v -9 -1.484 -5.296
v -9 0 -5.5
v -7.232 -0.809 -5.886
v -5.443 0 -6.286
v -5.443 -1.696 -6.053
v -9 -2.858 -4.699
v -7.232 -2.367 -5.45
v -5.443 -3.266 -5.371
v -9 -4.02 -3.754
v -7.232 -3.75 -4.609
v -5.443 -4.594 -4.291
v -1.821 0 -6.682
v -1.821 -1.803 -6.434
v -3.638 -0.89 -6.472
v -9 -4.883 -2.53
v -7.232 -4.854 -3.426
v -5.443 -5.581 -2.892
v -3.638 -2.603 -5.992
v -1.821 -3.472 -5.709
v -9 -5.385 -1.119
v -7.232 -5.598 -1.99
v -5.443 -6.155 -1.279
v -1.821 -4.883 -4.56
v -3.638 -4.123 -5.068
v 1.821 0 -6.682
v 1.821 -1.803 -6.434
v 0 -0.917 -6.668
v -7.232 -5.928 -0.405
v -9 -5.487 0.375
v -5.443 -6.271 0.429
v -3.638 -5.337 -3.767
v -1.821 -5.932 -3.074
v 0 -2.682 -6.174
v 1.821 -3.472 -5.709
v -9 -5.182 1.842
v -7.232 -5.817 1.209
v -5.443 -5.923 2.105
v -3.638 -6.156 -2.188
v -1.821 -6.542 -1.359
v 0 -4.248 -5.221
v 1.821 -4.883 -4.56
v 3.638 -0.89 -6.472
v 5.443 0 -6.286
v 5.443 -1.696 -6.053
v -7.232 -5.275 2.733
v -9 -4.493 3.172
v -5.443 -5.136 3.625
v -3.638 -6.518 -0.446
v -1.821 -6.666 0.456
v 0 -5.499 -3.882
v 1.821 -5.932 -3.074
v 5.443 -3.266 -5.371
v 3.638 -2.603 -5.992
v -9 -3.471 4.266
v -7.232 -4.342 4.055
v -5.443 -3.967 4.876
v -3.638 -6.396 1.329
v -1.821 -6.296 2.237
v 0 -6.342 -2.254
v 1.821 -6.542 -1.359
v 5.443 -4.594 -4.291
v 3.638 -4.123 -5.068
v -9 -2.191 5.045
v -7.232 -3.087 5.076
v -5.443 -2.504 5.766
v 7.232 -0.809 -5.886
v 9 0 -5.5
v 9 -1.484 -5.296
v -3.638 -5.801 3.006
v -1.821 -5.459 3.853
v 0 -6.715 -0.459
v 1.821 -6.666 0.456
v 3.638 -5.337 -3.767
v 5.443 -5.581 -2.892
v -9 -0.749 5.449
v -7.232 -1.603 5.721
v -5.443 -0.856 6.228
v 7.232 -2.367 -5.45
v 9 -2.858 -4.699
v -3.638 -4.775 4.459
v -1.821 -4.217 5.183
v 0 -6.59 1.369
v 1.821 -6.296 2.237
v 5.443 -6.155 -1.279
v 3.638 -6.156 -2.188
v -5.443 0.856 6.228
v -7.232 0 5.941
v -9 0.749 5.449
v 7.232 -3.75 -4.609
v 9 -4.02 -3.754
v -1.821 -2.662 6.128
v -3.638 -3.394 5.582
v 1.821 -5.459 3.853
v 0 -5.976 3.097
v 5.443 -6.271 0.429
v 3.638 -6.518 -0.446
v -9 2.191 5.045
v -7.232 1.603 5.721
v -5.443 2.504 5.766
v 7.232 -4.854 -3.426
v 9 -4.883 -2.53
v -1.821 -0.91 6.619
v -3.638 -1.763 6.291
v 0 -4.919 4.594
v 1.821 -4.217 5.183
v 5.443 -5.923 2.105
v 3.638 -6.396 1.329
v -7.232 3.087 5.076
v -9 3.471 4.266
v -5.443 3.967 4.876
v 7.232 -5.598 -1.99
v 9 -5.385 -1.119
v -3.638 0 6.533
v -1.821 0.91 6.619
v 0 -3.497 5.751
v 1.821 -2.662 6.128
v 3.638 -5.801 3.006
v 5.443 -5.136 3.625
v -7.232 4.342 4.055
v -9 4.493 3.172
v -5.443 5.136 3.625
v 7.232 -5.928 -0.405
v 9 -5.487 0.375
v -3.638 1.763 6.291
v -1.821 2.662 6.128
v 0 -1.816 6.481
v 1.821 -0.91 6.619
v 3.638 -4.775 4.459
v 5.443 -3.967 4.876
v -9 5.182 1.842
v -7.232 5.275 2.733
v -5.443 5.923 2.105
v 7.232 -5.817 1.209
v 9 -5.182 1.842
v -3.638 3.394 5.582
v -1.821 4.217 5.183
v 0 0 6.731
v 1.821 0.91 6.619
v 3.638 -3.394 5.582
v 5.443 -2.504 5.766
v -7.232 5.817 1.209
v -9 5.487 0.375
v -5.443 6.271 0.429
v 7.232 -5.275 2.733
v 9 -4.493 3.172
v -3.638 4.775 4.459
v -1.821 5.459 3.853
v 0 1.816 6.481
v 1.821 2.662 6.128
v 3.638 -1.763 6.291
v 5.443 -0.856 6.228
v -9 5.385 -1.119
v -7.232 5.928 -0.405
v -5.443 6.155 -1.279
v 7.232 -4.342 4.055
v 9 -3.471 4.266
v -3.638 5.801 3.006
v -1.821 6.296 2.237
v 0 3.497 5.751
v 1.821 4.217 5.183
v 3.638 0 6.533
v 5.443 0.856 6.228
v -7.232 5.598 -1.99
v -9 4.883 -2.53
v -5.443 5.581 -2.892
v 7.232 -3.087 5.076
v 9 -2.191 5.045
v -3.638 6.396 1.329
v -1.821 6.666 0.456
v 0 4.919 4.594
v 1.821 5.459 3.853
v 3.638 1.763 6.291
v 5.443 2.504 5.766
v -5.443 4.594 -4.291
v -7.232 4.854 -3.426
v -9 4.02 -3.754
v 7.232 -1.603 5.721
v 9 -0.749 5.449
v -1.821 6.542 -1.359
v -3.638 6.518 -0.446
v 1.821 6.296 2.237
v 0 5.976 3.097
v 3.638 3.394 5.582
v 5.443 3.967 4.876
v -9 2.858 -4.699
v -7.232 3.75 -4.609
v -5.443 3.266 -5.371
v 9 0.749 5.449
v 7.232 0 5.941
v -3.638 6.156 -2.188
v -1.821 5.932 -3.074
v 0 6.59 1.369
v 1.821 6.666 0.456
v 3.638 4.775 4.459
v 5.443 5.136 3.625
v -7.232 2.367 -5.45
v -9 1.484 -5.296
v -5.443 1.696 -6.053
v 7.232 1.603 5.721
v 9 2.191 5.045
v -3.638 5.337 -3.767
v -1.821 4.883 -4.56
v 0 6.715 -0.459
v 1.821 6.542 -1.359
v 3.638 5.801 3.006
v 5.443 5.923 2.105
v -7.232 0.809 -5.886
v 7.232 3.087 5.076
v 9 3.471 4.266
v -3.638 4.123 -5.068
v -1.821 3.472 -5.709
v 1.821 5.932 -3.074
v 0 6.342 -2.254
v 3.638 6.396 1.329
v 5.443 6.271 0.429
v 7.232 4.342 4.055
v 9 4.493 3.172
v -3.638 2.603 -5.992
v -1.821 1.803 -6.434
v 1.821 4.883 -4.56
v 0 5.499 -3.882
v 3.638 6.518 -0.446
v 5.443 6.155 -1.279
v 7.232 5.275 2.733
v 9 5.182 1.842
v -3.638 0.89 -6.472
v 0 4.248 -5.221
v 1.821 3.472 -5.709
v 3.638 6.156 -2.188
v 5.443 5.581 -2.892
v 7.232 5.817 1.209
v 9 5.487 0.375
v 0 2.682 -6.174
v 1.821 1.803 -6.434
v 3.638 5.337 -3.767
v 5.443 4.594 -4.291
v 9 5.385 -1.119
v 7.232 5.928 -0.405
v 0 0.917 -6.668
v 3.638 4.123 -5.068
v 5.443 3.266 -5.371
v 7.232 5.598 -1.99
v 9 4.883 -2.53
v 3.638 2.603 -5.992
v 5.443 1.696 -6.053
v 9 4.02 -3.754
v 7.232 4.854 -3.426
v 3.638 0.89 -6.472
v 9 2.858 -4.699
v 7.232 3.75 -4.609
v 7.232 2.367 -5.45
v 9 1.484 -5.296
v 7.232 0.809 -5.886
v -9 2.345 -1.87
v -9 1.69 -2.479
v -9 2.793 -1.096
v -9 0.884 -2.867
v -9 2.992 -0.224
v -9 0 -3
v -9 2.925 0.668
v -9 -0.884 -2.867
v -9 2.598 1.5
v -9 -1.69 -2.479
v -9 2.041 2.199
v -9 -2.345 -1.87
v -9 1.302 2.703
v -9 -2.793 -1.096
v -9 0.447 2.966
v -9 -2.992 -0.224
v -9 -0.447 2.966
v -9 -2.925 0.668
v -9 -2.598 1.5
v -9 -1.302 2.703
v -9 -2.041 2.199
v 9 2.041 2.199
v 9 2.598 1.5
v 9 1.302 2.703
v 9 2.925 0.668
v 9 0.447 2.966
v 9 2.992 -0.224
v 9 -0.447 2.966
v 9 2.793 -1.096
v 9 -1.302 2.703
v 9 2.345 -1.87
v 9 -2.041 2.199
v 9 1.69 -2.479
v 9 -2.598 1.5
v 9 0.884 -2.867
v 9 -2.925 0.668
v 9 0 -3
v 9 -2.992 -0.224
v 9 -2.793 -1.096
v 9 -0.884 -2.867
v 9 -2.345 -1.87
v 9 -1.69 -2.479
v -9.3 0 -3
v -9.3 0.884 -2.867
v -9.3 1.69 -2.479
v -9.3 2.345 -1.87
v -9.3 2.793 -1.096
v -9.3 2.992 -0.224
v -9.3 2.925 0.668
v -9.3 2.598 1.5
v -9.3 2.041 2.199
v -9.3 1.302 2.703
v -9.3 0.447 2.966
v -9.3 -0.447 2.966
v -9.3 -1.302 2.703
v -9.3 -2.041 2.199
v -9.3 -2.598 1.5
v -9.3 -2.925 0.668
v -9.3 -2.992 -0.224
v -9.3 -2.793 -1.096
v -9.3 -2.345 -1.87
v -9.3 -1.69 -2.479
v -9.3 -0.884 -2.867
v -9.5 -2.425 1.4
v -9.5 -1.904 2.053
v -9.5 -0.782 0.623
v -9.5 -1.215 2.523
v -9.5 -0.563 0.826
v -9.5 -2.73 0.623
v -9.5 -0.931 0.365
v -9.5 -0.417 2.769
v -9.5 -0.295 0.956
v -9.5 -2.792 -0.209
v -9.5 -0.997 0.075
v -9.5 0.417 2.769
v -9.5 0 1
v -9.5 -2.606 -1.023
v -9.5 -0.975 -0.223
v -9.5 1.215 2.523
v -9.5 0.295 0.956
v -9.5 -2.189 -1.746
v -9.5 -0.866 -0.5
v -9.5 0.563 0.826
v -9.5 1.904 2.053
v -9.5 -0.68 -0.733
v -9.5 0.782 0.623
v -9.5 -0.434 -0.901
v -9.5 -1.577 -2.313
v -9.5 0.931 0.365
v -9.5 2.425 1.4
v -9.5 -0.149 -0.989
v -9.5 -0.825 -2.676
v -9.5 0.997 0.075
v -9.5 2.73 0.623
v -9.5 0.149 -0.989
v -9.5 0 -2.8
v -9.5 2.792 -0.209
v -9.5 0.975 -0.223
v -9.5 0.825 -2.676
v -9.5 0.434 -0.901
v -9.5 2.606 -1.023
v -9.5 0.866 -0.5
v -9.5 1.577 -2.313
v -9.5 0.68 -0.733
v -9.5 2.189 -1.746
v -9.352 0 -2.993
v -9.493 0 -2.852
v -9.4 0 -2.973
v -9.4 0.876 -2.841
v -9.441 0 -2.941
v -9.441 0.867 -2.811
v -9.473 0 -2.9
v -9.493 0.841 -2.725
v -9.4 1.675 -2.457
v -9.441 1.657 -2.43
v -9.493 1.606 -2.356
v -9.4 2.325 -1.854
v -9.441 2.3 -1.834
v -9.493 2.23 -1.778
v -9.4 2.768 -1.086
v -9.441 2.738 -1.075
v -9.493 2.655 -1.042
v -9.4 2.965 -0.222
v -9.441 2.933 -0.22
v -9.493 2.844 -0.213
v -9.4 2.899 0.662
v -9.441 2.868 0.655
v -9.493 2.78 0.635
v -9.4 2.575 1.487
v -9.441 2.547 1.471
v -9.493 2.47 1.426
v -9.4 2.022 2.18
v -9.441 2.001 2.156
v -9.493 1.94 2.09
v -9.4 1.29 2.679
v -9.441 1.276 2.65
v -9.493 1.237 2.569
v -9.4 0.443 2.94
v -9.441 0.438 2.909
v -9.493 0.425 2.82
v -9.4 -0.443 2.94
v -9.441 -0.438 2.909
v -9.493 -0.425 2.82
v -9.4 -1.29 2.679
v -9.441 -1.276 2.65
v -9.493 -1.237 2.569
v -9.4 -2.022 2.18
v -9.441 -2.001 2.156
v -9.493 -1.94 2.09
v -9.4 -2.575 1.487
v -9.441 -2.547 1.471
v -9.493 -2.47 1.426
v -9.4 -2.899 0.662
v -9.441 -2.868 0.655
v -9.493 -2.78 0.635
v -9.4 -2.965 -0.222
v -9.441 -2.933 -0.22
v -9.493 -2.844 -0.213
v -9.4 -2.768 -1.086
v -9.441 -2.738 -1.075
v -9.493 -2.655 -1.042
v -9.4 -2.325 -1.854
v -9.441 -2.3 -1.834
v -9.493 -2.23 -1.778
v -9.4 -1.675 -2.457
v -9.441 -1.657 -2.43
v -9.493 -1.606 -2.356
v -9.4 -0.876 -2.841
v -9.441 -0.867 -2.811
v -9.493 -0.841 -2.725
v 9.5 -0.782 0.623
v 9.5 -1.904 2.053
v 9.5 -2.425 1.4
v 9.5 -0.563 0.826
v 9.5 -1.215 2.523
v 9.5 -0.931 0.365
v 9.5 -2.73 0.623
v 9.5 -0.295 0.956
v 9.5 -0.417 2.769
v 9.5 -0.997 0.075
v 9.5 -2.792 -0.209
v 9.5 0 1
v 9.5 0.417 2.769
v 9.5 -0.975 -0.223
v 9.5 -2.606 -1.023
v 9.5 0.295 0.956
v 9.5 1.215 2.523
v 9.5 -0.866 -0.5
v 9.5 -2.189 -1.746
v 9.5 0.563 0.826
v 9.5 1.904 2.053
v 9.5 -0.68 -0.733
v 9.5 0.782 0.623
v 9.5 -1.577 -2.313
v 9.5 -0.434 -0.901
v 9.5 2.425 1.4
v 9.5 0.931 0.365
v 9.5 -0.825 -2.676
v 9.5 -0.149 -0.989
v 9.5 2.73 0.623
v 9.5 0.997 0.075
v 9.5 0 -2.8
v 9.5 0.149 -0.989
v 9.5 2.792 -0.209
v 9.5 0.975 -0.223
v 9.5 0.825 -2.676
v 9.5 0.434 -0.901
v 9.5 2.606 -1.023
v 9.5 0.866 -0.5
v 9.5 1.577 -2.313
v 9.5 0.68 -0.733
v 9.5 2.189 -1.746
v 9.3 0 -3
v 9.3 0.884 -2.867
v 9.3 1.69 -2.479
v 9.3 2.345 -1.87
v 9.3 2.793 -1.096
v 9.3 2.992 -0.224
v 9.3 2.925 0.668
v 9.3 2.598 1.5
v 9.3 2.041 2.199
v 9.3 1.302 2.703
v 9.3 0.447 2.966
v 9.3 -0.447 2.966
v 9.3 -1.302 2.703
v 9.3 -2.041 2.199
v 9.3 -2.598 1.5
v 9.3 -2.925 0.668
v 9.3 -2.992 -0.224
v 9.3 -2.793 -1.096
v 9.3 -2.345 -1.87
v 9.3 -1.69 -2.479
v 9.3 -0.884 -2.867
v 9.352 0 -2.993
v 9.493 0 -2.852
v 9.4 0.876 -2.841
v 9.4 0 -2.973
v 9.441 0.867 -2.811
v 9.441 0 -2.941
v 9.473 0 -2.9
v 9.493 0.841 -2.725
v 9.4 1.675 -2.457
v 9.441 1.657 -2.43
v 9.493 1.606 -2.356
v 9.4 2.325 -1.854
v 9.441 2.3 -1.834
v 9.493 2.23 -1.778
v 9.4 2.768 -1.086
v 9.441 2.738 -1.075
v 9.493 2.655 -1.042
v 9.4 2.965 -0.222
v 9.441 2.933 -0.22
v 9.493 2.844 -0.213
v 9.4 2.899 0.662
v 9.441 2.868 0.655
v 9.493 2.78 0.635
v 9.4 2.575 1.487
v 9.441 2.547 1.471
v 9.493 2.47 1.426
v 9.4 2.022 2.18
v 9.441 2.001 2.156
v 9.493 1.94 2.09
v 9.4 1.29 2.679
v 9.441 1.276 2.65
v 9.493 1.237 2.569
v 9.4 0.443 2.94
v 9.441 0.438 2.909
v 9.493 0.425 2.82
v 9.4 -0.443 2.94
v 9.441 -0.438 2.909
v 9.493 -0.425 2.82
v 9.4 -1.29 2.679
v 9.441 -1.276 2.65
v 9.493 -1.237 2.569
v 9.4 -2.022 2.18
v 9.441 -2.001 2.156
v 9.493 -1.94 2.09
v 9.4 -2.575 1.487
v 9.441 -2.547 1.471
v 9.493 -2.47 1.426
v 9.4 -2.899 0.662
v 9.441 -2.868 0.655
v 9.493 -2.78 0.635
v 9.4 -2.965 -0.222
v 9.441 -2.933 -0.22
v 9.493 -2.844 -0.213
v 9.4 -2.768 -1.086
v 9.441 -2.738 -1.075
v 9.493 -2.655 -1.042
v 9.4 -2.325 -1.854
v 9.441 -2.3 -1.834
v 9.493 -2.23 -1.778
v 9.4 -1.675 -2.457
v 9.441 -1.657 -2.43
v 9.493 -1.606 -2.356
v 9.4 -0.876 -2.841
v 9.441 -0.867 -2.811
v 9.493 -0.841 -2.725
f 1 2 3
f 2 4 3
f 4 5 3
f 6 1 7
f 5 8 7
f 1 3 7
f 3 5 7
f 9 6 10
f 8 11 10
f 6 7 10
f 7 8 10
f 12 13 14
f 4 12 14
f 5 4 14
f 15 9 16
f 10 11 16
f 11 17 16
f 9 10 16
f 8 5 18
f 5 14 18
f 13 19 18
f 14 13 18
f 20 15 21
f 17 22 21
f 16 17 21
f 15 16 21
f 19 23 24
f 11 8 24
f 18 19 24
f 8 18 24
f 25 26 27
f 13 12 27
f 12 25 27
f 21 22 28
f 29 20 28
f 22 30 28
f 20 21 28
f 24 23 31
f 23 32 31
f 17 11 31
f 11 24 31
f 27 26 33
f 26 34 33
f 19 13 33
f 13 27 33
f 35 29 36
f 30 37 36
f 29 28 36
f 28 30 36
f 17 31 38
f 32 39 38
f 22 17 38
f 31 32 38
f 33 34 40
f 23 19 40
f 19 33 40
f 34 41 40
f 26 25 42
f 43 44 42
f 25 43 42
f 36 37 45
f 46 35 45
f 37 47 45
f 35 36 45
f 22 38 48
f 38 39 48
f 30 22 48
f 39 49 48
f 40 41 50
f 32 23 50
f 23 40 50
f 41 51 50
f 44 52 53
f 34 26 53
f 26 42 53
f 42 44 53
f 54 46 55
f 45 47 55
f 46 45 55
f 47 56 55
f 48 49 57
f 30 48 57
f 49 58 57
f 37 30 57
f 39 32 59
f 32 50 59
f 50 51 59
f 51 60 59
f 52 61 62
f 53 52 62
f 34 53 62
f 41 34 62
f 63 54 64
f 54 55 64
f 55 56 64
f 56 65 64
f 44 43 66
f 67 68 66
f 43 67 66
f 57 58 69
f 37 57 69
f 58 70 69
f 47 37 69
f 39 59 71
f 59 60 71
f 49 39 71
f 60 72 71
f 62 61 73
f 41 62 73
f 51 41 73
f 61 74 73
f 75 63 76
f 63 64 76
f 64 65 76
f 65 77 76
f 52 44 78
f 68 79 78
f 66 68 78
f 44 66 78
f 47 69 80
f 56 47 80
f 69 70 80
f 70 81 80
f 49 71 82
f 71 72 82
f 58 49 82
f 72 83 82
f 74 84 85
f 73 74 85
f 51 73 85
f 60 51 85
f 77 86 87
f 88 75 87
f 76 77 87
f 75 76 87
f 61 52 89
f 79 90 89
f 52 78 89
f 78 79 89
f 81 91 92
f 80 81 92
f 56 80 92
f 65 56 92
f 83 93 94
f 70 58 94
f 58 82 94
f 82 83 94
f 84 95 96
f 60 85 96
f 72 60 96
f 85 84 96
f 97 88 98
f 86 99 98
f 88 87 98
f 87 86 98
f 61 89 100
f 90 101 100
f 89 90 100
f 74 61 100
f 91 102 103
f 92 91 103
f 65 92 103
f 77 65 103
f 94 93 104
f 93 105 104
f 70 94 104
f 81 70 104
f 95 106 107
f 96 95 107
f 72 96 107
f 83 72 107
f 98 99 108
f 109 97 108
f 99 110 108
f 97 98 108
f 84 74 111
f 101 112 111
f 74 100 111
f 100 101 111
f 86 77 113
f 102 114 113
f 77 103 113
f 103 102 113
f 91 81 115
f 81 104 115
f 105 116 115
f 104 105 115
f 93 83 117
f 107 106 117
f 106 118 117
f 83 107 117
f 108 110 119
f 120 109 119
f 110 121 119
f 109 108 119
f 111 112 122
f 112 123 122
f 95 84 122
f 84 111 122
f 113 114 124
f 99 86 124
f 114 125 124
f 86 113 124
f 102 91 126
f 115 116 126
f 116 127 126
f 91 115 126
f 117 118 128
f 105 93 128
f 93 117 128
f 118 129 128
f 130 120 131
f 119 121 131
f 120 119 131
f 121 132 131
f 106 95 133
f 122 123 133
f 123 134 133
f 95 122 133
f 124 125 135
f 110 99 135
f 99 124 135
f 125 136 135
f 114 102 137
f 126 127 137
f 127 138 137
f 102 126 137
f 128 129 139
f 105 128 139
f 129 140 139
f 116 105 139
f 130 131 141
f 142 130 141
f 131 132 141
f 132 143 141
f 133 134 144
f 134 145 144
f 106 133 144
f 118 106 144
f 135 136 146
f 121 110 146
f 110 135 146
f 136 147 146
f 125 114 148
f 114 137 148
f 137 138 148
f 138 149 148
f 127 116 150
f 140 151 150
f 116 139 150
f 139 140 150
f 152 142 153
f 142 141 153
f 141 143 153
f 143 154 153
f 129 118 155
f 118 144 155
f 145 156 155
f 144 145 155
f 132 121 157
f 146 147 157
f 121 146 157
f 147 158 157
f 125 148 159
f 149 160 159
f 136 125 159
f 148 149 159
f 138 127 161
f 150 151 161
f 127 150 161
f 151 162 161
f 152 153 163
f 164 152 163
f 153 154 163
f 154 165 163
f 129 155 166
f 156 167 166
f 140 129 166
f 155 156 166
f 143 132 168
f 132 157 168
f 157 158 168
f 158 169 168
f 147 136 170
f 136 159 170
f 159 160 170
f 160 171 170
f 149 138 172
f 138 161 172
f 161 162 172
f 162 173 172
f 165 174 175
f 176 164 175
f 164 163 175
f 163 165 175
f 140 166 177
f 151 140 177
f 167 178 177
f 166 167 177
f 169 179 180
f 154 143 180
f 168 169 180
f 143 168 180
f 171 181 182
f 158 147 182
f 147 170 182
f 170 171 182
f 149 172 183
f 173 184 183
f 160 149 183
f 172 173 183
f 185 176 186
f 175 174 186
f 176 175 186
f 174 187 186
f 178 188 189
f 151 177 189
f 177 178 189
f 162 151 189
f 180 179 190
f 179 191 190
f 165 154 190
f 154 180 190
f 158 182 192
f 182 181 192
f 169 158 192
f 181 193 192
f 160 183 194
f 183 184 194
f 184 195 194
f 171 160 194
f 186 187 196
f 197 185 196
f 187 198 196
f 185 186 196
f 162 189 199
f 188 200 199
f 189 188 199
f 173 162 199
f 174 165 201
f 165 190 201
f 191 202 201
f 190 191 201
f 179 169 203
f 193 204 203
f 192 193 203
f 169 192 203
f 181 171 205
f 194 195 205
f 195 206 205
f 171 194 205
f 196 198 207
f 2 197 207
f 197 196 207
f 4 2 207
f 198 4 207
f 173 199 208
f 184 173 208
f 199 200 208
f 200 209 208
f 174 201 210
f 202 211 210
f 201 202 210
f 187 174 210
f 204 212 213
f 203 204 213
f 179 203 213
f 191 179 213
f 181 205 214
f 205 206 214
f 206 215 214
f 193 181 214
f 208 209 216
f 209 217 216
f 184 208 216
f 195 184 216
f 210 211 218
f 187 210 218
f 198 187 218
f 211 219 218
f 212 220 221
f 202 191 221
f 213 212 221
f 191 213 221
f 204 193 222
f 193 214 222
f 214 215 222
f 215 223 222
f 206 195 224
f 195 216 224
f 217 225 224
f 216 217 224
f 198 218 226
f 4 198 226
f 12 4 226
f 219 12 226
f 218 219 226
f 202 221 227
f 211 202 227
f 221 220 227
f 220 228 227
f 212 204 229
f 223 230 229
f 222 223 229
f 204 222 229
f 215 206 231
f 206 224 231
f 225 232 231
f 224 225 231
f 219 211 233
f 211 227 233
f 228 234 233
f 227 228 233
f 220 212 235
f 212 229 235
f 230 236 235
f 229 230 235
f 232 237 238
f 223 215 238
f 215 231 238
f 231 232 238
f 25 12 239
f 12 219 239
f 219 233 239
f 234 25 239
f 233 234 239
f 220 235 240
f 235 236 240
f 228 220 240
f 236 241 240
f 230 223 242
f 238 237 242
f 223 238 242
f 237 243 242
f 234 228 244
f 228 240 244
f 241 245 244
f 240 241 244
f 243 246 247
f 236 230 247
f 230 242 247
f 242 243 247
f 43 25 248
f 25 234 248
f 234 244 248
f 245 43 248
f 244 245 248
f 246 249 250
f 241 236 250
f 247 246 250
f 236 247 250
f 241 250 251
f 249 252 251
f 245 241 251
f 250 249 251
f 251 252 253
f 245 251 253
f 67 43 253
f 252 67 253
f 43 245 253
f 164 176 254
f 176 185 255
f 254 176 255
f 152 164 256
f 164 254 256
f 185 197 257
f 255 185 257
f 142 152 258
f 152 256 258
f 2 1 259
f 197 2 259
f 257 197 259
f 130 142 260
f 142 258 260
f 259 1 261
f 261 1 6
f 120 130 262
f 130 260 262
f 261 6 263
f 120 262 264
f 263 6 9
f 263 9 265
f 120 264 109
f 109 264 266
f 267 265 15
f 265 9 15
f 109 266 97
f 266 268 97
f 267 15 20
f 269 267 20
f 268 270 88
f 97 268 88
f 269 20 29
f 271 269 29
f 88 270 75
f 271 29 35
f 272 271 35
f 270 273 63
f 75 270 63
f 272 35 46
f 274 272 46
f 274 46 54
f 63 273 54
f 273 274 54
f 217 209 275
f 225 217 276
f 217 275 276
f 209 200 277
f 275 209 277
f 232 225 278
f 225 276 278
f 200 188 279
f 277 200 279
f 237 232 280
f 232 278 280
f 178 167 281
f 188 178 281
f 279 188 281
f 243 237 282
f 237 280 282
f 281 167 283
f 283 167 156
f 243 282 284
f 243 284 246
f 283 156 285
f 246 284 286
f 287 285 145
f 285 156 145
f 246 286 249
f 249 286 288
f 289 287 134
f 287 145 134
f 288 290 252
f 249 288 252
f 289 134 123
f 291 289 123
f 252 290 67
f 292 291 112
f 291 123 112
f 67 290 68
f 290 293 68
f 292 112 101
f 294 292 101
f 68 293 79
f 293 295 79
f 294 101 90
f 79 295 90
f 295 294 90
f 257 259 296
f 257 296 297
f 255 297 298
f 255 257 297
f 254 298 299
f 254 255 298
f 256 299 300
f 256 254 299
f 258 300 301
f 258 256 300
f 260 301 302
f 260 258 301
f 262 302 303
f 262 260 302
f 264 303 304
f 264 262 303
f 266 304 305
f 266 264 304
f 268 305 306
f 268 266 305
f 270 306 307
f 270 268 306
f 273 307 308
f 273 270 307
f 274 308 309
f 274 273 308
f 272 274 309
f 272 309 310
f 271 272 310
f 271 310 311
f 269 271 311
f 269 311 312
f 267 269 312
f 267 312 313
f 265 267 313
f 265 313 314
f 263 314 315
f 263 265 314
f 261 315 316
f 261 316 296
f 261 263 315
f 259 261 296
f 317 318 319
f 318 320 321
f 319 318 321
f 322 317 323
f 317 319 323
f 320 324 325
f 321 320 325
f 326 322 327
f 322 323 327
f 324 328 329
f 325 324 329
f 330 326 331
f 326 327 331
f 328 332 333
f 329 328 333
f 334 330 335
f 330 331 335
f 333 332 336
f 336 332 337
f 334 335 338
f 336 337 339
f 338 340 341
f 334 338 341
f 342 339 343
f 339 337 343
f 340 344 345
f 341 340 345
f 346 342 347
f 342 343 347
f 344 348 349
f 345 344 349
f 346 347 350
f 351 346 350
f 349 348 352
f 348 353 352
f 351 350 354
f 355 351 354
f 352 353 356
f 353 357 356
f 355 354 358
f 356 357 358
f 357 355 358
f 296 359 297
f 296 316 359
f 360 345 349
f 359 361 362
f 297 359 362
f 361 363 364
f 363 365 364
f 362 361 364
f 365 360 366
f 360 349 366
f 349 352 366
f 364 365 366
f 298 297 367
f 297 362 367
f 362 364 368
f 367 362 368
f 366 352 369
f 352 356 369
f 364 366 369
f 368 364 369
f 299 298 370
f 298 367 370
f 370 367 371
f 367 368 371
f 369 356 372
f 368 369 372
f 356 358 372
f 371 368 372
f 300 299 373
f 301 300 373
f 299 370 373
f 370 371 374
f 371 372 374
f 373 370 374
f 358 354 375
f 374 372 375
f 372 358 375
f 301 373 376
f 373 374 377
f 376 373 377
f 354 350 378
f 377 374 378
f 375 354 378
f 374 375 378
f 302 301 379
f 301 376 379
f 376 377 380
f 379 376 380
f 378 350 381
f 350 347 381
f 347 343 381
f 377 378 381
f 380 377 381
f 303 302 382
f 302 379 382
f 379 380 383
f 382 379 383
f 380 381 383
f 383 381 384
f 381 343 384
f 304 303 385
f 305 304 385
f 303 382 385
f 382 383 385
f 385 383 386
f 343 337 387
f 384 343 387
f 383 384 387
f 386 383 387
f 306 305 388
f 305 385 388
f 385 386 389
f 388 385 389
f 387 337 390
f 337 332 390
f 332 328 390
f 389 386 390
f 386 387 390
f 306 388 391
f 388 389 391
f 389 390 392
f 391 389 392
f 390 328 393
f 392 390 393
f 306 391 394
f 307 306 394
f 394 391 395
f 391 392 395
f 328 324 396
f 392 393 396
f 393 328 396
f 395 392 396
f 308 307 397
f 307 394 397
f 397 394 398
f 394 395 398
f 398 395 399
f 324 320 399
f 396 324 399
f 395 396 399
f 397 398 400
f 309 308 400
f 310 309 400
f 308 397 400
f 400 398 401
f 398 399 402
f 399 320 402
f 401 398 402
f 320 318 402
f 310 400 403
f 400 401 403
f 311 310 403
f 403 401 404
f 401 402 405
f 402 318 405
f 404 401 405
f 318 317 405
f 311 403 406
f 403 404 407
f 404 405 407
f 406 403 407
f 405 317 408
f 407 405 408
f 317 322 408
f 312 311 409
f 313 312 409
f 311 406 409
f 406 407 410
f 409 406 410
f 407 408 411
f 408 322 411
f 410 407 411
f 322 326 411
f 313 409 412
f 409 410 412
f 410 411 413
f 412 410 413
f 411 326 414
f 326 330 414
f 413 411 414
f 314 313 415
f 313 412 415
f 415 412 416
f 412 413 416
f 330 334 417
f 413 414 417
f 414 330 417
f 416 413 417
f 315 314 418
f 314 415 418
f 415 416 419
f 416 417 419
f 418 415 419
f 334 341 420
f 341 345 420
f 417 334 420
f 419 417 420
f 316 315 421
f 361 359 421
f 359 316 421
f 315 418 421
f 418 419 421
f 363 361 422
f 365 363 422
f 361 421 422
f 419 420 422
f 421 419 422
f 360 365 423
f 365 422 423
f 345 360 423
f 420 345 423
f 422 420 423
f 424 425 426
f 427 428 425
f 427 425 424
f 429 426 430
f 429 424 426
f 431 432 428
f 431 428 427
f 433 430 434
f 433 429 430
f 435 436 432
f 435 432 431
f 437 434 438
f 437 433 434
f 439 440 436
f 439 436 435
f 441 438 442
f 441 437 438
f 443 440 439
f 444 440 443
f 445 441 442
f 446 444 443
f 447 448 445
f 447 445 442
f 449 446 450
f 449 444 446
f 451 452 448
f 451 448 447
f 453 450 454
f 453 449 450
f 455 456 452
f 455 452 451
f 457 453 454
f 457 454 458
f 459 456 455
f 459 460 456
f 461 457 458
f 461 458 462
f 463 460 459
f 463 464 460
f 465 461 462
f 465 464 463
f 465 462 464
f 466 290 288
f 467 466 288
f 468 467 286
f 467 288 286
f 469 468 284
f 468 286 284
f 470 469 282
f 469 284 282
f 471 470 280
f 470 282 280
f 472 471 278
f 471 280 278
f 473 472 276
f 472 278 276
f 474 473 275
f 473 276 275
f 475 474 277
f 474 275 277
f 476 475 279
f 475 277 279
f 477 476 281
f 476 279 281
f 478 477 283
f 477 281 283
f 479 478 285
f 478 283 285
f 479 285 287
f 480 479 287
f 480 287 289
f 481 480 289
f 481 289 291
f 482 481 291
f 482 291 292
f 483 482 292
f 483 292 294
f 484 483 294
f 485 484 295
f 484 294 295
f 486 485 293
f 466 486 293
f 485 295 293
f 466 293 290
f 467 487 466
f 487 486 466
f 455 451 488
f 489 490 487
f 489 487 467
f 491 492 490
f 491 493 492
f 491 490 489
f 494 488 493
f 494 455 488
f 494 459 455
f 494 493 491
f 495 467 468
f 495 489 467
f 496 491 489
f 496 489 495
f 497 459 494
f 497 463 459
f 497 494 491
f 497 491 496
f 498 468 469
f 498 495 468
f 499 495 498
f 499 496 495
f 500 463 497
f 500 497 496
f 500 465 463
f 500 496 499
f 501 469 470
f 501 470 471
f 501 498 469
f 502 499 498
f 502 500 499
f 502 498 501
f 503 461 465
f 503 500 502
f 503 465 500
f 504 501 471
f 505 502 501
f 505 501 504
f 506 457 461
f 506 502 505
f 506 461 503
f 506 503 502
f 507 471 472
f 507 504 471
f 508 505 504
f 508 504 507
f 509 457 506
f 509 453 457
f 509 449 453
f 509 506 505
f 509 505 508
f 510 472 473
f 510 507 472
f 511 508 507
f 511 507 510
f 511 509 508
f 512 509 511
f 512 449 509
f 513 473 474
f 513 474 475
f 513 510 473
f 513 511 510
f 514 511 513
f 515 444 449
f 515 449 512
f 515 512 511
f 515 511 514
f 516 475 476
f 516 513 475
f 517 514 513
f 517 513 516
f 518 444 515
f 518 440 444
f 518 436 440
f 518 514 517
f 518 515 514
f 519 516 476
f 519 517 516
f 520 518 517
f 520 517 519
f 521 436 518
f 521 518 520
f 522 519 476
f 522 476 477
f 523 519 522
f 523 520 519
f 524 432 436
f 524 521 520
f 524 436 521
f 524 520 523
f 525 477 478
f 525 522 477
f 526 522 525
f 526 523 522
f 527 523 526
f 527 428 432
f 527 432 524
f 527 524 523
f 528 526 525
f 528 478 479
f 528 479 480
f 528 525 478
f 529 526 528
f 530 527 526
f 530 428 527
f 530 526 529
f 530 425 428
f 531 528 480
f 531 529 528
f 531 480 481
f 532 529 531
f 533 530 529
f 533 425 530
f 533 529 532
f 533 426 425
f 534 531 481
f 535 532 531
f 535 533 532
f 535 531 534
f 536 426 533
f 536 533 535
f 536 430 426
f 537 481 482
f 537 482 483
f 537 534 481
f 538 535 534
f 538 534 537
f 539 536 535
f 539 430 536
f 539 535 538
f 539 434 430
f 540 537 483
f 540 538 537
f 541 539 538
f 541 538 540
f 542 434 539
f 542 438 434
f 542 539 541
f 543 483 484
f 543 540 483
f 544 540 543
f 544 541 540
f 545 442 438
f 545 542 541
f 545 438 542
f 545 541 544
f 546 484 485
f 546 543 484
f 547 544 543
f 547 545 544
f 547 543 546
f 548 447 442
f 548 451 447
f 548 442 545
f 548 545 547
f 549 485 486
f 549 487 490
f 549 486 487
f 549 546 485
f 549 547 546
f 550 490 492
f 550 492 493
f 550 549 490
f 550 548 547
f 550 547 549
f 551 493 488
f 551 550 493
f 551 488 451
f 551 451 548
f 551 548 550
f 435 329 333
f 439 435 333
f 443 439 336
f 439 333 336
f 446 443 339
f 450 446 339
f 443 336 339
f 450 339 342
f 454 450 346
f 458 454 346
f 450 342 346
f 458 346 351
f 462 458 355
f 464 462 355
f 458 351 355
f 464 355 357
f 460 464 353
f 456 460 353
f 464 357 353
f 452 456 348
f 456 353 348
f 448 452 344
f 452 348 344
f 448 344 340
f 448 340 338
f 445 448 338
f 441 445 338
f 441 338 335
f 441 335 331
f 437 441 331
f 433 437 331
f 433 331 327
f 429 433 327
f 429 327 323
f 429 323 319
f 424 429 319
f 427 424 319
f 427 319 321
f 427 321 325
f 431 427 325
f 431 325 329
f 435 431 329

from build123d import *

# Parameters (mm, degrees)
SKETCH3_R           = 3
BOSS_EXTRUDE1_DEPTH = 0.5
SKETCH4_R           = 1
CUT_EXTRUDE2_DEPTH  = 22.251203514
FILLET1_R           = 0.2


with BuildPart() as part:
    # Sketch1 → Revolve1 (revolve)
    with BuildSketch(Plane(origin=(0, 0, 0), x_dir=(1, 0, 0), z_dir=(0, 1, 0))):
        with BuildLine():
            Line((0, 0), (-9, 0))
            Line((-9, 0), (-9, 5.5))
            ThreePointArc((-9, 5.5), (0, 6.731034397), (9, 5.5))
            Line((9, 5.5), (9, 0))
            Line((9, 0), (0, 0))
        make_face()
    revolve(axis=Axis((0, 0, 0), (-1, 0, 0)))

    # Sketch3 → Boss-Extrude1 (add)
    with BuildSketch(Plane(origin=(9, 0, 0), x_dir=(0, 0, -1), z_dir=(1, 0, 0))):
        Circle(SKETCH3_R)
    boss_extrude1 = extrude(amount=BOSS_EXTRUDE1_DEPTH)

    # Mirror1: Boss-Extrude1 across plane
    add(boss_extrude1.mirror(Plane(origin=(0, 0, 0), x_dir=(0, 0, 1), z_dir=(1, 0, 0))))

    # Sketch4 → Cut-Extrude2 (cut, through all)
    with BuildSketch(Plane.ZY.offset(9.5)):
        Circle(SKETCH4_R)
    extrude(amount=-CUT_EXTRUDE2_DEPTH, mode=Mode.SUBTRACT)

    # Fillet1
    fillet1_edges = [part.edges().sort_by_distance(p)[0] for p in [
        (9.5, 0, 3),
        (-9.5, 0, 3),
    ]]
    fillet(fillet1_edges, radius=FILLET1_R)


solid = part.part
